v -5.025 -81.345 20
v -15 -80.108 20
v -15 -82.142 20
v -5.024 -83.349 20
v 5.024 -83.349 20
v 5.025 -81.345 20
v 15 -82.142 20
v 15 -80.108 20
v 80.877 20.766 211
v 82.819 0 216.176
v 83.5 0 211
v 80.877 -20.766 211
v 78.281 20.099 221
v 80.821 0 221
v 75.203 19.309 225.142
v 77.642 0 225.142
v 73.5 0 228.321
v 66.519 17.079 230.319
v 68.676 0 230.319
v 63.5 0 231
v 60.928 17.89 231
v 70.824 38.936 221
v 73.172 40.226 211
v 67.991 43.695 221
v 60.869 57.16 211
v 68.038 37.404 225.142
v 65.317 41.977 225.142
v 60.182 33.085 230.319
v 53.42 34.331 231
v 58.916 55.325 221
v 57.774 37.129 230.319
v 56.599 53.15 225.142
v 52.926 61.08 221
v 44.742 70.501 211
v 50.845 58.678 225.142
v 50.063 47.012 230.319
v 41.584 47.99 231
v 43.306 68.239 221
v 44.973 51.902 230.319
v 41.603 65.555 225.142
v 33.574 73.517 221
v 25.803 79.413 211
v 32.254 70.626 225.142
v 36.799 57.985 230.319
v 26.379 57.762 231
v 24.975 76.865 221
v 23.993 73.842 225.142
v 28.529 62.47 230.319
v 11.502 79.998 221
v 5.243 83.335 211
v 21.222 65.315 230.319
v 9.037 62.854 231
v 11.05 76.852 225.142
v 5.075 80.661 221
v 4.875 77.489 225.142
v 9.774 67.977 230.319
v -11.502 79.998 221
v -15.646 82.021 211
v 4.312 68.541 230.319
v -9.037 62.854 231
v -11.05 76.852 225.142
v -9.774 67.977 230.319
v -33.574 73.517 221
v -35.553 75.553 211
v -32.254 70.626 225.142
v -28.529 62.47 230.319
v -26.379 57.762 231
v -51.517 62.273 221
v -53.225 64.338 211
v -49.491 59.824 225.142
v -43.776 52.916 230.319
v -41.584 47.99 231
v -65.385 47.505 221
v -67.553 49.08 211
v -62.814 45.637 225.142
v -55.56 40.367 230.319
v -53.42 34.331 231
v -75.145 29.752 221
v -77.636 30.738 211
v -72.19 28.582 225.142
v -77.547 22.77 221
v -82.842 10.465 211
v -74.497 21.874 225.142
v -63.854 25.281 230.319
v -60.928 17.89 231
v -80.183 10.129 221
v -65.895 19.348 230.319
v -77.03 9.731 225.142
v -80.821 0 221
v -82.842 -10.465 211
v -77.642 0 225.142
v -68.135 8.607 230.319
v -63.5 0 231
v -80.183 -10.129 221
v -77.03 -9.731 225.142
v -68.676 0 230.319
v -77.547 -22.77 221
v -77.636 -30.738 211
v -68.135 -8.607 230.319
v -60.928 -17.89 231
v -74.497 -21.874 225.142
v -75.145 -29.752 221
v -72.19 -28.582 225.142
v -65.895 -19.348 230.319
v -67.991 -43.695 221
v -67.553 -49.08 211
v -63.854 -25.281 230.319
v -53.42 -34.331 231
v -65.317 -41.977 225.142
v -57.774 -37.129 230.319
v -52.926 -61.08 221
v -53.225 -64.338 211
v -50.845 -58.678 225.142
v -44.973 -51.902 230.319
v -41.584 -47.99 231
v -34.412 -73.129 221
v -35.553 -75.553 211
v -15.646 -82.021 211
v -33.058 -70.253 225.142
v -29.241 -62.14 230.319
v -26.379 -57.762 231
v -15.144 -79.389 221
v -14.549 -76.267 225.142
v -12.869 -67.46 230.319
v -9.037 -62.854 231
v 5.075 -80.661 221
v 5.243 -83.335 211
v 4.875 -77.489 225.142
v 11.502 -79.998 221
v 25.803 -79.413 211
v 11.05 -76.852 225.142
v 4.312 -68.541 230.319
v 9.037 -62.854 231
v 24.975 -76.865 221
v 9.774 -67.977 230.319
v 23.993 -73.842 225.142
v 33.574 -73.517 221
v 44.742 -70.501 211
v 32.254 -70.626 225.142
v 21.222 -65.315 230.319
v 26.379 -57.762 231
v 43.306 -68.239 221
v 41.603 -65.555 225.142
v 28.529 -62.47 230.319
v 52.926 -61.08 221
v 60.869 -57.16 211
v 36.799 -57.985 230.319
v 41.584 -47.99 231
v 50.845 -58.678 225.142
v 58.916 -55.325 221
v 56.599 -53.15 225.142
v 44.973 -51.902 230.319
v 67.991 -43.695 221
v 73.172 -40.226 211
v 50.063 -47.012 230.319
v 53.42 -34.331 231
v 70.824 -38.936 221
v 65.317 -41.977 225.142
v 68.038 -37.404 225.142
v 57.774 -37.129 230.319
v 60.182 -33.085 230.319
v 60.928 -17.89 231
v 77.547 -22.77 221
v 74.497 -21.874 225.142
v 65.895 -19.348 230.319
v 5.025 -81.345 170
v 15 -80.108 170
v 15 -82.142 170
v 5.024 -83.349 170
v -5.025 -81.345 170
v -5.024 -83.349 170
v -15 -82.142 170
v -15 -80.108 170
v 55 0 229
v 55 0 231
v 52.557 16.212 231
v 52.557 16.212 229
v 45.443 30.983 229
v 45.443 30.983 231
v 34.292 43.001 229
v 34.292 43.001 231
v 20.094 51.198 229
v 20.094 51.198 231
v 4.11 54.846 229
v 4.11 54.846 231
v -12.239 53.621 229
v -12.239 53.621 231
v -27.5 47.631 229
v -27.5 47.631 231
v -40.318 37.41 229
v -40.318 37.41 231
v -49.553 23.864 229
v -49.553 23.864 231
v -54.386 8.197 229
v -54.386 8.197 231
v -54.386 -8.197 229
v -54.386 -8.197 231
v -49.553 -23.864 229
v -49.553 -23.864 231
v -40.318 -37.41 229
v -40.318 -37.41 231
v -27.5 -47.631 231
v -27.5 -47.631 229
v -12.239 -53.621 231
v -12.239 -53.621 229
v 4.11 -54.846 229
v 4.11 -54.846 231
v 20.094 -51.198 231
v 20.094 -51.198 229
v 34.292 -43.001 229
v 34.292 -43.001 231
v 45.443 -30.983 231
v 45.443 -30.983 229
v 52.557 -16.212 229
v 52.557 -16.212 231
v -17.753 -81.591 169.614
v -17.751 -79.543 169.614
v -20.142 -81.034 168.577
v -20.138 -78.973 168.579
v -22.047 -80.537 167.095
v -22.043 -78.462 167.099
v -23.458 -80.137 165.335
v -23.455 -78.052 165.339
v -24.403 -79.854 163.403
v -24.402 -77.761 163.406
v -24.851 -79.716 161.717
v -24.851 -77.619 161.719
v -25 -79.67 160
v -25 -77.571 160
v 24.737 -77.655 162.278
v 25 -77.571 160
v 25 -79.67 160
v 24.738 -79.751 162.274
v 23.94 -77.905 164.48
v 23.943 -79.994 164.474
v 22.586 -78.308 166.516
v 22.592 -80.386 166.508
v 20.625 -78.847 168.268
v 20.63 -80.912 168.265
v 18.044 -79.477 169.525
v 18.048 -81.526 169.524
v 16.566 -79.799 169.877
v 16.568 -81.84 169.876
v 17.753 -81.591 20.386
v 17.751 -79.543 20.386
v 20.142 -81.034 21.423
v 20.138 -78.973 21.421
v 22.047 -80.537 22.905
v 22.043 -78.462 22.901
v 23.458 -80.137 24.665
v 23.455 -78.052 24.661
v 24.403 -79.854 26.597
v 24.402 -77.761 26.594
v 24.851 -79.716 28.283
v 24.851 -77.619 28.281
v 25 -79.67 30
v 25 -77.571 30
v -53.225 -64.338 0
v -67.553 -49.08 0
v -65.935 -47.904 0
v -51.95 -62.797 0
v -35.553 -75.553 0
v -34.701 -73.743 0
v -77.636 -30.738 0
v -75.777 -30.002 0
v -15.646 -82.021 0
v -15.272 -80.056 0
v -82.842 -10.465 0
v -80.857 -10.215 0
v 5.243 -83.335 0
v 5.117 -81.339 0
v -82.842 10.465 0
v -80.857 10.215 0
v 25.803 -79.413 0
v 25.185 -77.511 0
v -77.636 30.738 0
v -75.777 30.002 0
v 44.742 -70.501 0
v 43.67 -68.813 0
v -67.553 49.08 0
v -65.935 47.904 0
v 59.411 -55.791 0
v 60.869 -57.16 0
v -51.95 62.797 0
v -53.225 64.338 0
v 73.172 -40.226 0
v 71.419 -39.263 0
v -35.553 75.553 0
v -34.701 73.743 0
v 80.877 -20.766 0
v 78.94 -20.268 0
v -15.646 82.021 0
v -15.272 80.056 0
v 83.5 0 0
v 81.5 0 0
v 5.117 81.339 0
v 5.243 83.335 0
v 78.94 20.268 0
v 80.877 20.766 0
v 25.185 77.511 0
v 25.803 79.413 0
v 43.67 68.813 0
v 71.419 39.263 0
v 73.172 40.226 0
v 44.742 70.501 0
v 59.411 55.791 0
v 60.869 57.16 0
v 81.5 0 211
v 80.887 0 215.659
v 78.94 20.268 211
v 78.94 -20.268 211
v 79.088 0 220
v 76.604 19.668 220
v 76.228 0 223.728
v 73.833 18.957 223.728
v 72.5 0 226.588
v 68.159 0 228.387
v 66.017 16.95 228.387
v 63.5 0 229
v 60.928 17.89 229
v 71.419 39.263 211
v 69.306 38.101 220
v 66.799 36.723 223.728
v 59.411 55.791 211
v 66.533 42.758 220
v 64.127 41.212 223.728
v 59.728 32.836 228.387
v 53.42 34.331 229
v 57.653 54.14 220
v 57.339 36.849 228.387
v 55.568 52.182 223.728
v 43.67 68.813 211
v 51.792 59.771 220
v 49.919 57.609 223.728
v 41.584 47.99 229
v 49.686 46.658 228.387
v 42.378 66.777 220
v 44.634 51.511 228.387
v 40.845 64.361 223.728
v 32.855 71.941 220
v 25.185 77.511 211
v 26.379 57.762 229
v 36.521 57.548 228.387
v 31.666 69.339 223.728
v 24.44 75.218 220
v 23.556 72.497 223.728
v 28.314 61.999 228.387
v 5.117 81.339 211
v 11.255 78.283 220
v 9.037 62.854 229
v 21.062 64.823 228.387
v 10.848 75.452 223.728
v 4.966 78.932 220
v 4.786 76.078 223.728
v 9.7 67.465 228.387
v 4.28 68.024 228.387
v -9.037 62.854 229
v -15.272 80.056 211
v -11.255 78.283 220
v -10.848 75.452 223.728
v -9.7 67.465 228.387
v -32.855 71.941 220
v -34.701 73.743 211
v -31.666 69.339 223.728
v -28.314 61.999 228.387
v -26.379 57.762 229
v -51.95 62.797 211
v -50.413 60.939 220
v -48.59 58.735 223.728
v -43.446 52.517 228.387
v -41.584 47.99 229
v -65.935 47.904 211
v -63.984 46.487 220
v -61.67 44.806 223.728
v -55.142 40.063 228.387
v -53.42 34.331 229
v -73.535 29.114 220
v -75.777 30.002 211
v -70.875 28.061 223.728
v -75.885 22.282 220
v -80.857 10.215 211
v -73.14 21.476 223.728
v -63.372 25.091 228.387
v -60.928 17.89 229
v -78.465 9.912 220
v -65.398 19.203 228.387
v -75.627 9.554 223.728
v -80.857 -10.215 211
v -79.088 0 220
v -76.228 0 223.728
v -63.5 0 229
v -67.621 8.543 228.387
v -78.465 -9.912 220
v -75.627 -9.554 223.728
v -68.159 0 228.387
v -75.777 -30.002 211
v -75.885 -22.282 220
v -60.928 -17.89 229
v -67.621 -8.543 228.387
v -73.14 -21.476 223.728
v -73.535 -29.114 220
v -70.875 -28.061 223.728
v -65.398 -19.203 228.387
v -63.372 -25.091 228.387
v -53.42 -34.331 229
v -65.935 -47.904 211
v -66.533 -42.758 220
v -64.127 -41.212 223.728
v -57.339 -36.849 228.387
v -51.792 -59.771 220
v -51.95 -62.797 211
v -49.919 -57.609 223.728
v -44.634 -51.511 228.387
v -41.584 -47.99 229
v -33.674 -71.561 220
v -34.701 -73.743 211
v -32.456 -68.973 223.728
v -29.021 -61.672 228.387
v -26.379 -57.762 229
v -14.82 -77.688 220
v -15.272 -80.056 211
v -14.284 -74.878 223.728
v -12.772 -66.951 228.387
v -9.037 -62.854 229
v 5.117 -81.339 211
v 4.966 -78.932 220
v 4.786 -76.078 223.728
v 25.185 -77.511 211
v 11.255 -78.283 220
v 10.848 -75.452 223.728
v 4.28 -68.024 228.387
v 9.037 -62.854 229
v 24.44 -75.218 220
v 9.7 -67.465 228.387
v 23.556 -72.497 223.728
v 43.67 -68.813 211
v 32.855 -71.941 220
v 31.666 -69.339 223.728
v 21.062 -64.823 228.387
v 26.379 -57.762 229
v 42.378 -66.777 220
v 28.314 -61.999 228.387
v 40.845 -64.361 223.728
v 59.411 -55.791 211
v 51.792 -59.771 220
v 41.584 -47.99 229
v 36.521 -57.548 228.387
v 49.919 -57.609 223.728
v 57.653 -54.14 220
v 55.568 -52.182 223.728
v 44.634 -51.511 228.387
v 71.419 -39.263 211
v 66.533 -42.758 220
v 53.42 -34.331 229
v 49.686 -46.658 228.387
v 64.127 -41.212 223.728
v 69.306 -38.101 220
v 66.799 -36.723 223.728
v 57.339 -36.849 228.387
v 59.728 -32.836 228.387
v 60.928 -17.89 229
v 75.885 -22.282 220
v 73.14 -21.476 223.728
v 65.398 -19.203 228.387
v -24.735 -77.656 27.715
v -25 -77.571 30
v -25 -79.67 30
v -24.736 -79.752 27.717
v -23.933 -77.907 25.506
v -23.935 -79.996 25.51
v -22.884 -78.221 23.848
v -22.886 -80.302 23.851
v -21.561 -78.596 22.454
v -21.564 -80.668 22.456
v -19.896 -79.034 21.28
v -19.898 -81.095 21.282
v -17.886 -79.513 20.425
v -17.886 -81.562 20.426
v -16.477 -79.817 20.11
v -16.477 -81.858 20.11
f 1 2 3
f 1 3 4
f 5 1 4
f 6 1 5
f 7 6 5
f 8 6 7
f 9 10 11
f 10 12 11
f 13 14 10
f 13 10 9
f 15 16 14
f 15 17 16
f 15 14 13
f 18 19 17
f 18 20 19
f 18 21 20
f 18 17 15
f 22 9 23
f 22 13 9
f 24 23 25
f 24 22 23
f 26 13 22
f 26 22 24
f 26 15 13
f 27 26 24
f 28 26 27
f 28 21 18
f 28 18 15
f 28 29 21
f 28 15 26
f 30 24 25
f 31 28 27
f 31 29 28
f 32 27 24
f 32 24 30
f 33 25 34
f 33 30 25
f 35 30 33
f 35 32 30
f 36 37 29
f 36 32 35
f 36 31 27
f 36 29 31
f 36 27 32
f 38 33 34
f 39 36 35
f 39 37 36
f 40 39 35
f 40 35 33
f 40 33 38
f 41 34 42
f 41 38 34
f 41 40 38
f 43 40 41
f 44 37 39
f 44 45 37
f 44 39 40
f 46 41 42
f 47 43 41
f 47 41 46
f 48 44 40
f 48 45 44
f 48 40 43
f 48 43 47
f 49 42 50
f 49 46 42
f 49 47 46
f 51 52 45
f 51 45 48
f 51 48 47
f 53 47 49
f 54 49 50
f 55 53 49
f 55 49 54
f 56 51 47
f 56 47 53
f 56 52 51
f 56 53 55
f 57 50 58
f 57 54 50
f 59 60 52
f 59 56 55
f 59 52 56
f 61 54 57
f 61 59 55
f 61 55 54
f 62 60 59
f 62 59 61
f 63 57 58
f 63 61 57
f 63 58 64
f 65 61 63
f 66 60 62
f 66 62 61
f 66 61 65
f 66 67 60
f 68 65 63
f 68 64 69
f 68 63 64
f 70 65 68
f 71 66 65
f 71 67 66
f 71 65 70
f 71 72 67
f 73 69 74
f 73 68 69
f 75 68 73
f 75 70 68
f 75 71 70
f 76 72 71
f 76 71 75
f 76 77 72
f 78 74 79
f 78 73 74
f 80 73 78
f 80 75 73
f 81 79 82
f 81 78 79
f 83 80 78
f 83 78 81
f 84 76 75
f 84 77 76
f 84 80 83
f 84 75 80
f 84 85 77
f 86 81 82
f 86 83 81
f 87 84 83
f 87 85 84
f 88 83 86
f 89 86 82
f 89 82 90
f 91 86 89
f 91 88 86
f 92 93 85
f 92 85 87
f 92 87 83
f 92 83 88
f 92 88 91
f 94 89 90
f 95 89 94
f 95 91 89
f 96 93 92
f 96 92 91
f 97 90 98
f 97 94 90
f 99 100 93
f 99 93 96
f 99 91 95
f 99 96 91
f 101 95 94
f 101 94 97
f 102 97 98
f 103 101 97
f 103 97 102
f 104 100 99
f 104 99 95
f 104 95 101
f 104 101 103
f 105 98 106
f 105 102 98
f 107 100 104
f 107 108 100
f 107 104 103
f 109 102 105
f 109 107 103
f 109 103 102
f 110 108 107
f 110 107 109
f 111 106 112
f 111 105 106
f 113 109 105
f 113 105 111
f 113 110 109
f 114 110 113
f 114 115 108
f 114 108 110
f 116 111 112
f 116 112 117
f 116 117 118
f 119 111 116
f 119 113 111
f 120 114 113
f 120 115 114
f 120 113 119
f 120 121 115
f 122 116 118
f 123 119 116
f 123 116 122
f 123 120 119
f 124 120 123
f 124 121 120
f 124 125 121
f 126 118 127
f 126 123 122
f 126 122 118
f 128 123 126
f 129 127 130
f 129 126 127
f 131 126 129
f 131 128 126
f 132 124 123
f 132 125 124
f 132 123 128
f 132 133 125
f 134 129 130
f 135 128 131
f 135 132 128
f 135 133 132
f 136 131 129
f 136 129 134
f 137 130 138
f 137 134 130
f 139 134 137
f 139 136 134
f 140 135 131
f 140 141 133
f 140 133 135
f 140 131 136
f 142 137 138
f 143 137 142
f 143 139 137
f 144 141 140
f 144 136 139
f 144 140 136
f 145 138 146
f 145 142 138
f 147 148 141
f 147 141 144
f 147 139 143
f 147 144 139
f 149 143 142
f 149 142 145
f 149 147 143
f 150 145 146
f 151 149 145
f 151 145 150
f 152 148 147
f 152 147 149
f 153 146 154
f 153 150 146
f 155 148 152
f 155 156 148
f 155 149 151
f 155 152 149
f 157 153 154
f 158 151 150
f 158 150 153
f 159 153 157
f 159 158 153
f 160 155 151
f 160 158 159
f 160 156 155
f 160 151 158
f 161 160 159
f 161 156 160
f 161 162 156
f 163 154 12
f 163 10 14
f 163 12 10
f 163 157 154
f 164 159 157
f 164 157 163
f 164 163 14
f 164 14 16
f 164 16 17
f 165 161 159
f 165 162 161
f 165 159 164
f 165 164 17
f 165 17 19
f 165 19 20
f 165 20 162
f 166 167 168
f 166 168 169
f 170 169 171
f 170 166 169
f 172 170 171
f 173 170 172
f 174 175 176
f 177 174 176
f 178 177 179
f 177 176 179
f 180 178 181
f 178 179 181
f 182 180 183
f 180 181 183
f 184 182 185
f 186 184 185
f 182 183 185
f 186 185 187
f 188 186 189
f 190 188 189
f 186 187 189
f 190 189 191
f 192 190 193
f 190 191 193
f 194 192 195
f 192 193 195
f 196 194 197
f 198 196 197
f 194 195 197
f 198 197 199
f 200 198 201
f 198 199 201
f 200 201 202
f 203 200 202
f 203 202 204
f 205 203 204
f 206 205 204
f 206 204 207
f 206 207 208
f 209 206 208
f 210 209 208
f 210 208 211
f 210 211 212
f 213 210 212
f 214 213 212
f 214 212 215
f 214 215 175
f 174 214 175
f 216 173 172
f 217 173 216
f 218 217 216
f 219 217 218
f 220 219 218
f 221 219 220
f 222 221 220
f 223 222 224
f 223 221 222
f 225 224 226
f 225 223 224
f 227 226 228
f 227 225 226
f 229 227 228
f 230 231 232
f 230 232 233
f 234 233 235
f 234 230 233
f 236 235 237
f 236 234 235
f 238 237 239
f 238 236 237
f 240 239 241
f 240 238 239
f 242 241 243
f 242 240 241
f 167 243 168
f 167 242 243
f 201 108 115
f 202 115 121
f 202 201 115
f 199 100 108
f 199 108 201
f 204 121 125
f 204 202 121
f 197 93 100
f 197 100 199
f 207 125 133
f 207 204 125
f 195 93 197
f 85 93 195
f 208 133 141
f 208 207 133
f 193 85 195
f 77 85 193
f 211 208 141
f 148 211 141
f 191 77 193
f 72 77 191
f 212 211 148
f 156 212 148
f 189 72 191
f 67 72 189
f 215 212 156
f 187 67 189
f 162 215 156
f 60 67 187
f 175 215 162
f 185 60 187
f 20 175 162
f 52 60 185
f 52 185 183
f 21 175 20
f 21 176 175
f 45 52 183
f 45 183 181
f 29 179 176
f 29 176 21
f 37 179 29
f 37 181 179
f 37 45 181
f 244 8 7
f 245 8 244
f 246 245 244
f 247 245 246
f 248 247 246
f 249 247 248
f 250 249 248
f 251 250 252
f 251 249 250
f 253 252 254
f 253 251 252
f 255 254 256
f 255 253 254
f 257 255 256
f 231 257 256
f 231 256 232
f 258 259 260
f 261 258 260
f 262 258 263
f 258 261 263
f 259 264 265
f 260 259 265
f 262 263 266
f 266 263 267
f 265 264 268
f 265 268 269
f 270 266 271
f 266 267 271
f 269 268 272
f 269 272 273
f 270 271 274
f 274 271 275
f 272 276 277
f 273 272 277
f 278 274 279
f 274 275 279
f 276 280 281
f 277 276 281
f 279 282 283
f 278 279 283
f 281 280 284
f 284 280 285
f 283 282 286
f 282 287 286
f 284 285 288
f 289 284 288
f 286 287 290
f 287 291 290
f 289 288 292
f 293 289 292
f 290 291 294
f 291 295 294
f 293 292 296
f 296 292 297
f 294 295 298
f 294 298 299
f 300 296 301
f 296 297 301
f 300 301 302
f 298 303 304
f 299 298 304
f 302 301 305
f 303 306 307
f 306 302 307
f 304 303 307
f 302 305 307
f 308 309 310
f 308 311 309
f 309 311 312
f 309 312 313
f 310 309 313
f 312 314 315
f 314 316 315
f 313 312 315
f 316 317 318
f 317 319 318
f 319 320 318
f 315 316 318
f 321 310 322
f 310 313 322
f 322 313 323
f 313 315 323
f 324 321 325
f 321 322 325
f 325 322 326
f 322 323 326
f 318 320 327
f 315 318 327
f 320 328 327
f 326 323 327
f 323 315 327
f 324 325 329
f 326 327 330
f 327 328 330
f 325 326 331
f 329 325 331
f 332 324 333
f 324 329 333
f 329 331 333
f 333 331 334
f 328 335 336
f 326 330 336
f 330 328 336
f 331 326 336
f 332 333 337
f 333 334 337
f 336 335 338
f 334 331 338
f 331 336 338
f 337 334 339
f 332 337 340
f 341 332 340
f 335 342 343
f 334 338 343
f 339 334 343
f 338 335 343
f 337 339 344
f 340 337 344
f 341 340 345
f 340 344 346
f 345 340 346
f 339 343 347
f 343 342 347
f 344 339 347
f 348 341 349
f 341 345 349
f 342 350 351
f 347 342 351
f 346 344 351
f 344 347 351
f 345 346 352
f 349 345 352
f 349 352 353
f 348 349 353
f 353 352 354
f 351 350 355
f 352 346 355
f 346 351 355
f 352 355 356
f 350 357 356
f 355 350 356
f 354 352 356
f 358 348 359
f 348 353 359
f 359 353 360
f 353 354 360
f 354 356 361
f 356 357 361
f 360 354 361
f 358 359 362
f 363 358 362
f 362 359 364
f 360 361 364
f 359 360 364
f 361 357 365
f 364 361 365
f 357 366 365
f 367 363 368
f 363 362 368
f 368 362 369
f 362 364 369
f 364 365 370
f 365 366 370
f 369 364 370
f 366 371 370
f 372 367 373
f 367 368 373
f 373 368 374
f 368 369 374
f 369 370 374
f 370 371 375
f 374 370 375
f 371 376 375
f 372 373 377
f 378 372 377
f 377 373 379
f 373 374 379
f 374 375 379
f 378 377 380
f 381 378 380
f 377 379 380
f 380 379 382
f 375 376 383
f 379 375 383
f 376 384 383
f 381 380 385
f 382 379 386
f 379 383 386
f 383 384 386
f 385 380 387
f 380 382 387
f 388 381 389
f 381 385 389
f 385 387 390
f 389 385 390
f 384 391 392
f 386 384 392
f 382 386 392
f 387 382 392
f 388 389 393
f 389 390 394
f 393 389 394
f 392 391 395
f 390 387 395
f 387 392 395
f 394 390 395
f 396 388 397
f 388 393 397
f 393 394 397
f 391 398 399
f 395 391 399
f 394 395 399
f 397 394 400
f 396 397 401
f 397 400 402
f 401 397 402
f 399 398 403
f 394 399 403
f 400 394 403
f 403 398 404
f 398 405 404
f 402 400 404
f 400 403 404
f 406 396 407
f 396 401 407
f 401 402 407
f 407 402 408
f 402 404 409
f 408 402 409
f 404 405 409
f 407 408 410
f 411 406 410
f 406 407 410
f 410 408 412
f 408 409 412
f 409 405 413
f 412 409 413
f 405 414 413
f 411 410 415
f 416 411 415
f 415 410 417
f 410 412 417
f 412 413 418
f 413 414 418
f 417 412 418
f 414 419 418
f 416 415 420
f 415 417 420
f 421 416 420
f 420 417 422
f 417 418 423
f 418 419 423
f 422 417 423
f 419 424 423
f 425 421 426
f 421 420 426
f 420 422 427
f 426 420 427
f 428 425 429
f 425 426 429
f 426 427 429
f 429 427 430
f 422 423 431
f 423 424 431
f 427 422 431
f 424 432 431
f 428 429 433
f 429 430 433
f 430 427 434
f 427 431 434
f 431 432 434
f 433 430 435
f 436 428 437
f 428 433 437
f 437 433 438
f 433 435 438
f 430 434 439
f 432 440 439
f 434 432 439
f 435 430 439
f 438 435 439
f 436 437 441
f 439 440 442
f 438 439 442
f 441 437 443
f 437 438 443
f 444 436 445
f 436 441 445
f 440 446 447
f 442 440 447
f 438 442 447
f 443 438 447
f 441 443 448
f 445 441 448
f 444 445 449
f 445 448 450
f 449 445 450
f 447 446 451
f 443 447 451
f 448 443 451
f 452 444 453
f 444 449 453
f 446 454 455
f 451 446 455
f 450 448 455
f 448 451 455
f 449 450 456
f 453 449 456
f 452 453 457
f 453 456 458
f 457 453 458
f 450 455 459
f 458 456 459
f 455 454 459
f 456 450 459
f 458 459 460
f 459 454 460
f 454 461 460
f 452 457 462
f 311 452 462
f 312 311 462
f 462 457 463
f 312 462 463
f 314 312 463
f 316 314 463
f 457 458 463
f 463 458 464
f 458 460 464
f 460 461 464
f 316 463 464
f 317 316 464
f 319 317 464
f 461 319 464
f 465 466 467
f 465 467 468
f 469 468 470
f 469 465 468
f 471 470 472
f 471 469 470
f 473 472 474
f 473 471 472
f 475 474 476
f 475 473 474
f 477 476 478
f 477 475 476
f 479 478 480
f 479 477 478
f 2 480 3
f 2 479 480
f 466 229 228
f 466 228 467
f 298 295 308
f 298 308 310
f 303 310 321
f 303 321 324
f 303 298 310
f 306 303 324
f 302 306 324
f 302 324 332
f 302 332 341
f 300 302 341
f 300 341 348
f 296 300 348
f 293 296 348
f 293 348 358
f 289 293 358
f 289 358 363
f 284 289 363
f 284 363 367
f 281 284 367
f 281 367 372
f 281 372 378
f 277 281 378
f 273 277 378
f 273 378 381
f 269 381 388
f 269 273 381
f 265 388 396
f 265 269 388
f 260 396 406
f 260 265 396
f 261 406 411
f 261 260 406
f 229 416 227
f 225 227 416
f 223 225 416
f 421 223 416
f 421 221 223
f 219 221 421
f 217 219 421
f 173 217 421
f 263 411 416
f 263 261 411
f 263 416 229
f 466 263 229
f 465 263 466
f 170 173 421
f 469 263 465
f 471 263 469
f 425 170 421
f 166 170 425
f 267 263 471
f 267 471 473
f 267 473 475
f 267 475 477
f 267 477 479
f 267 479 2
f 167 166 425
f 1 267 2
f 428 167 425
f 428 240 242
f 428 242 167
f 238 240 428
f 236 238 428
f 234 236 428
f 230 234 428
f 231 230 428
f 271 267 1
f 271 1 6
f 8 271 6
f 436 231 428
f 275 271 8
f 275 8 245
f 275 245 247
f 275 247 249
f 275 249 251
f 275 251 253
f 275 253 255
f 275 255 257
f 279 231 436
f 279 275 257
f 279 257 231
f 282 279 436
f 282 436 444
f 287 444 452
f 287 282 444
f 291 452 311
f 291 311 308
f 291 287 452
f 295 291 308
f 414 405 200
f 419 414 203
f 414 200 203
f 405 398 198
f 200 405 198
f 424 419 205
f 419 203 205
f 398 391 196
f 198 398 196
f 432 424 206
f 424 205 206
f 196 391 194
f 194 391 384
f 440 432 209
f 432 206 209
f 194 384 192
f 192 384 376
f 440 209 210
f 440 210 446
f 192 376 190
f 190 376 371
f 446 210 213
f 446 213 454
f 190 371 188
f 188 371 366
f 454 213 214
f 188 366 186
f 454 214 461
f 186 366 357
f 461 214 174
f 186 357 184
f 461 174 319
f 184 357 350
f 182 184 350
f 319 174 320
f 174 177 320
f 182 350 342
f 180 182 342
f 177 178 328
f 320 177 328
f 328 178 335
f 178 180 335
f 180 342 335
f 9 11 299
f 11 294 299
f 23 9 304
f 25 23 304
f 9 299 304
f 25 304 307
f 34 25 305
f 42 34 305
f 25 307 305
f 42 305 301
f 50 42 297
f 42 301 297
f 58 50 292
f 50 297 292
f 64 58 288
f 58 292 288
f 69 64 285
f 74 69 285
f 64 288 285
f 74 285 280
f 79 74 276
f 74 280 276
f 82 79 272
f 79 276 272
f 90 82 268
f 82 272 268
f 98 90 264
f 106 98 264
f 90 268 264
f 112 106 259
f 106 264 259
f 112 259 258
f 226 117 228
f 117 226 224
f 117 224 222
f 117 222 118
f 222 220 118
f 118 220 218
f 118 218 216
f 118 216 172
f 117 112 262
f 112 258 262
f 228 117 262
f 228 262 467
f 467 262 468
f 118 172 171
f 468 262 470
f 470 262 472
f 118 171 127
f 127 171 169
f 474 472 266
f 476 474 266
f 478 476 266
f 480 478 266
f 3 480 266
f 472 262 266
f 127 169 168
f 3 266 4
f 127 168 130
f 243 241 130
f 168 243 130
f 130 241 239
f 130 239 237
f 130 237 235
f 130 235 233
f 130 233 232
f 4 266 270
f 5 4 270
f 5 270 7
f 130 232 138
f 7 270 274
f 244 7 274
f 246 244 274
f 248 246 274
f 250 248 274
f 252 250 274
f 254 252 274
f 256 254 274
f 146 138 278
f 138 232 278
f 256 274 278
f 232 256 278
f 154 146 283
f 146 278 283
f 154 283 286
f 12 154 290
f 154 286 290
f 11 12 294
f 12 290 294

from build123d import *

# Parameters (mm, degrees)
F0_R     = 83.5
F1_DEPTH = 231
F2_R     = 20
F3_T     = -2
F5_DEPTH = 84.5000001
F6_R     = 55
F7_DEPTH = 25


with BuildPart() as f1:
    # F0 (on Top) → F1 (new body)
    with BuildSketch(Plane.XY):
        Circle(F0_R)
    extrude(amount=F1_DEPTH)

    # F2
    f2_edges = [f1.edges().sort_by_distance(p)[0] for p in [
        (-83.5, 0, 231),
    ]]
    fillet(f2_edges, radius=F2_R)

    # F3
    f3_openings = [f1.faces().sort_by_distance(p)[0] for p in [
        (0, 0, 0),
    ]]
    offset(amount=F3_T, openings=f3_openings)

    # F4 (on Front) → F5 (cut, up to face)
    with BuildSketch(Plane.XZ):
        with BuildLine():
            Line((-15, 20), (15, 20))
            ThreePointArc((15, 20), (22.0710678119, 22.9289321881), (25, 30))
            Line((25, 30), (25, 160))
            ThreePointArc((25, 160), (22.0710678119, 167.0710678119), (15, 170))
            Line((15, 170), (-15, 170))
            ThreePointArc((-15, 170), (-22.0710678119, 167.0710678119), (-25, 160))
            Line((-25, 160), (-25, 30))
            ThreePointArc((-25, 30), (-22.0710678119, 22.9289321881), (-15, 20))
        make_face()
    extrude(amount=F5_DEPTH, mode=Mode.SUBTRACT)

    # F6 (on face) → F7 (cut)
    with BuildSketch(Plane.XY.offset(231)):
        Circle(F6_R)
    extrude(amount=-F7_DEPTH, mode=Mode.SUBTRACT)


solid = f1.part
